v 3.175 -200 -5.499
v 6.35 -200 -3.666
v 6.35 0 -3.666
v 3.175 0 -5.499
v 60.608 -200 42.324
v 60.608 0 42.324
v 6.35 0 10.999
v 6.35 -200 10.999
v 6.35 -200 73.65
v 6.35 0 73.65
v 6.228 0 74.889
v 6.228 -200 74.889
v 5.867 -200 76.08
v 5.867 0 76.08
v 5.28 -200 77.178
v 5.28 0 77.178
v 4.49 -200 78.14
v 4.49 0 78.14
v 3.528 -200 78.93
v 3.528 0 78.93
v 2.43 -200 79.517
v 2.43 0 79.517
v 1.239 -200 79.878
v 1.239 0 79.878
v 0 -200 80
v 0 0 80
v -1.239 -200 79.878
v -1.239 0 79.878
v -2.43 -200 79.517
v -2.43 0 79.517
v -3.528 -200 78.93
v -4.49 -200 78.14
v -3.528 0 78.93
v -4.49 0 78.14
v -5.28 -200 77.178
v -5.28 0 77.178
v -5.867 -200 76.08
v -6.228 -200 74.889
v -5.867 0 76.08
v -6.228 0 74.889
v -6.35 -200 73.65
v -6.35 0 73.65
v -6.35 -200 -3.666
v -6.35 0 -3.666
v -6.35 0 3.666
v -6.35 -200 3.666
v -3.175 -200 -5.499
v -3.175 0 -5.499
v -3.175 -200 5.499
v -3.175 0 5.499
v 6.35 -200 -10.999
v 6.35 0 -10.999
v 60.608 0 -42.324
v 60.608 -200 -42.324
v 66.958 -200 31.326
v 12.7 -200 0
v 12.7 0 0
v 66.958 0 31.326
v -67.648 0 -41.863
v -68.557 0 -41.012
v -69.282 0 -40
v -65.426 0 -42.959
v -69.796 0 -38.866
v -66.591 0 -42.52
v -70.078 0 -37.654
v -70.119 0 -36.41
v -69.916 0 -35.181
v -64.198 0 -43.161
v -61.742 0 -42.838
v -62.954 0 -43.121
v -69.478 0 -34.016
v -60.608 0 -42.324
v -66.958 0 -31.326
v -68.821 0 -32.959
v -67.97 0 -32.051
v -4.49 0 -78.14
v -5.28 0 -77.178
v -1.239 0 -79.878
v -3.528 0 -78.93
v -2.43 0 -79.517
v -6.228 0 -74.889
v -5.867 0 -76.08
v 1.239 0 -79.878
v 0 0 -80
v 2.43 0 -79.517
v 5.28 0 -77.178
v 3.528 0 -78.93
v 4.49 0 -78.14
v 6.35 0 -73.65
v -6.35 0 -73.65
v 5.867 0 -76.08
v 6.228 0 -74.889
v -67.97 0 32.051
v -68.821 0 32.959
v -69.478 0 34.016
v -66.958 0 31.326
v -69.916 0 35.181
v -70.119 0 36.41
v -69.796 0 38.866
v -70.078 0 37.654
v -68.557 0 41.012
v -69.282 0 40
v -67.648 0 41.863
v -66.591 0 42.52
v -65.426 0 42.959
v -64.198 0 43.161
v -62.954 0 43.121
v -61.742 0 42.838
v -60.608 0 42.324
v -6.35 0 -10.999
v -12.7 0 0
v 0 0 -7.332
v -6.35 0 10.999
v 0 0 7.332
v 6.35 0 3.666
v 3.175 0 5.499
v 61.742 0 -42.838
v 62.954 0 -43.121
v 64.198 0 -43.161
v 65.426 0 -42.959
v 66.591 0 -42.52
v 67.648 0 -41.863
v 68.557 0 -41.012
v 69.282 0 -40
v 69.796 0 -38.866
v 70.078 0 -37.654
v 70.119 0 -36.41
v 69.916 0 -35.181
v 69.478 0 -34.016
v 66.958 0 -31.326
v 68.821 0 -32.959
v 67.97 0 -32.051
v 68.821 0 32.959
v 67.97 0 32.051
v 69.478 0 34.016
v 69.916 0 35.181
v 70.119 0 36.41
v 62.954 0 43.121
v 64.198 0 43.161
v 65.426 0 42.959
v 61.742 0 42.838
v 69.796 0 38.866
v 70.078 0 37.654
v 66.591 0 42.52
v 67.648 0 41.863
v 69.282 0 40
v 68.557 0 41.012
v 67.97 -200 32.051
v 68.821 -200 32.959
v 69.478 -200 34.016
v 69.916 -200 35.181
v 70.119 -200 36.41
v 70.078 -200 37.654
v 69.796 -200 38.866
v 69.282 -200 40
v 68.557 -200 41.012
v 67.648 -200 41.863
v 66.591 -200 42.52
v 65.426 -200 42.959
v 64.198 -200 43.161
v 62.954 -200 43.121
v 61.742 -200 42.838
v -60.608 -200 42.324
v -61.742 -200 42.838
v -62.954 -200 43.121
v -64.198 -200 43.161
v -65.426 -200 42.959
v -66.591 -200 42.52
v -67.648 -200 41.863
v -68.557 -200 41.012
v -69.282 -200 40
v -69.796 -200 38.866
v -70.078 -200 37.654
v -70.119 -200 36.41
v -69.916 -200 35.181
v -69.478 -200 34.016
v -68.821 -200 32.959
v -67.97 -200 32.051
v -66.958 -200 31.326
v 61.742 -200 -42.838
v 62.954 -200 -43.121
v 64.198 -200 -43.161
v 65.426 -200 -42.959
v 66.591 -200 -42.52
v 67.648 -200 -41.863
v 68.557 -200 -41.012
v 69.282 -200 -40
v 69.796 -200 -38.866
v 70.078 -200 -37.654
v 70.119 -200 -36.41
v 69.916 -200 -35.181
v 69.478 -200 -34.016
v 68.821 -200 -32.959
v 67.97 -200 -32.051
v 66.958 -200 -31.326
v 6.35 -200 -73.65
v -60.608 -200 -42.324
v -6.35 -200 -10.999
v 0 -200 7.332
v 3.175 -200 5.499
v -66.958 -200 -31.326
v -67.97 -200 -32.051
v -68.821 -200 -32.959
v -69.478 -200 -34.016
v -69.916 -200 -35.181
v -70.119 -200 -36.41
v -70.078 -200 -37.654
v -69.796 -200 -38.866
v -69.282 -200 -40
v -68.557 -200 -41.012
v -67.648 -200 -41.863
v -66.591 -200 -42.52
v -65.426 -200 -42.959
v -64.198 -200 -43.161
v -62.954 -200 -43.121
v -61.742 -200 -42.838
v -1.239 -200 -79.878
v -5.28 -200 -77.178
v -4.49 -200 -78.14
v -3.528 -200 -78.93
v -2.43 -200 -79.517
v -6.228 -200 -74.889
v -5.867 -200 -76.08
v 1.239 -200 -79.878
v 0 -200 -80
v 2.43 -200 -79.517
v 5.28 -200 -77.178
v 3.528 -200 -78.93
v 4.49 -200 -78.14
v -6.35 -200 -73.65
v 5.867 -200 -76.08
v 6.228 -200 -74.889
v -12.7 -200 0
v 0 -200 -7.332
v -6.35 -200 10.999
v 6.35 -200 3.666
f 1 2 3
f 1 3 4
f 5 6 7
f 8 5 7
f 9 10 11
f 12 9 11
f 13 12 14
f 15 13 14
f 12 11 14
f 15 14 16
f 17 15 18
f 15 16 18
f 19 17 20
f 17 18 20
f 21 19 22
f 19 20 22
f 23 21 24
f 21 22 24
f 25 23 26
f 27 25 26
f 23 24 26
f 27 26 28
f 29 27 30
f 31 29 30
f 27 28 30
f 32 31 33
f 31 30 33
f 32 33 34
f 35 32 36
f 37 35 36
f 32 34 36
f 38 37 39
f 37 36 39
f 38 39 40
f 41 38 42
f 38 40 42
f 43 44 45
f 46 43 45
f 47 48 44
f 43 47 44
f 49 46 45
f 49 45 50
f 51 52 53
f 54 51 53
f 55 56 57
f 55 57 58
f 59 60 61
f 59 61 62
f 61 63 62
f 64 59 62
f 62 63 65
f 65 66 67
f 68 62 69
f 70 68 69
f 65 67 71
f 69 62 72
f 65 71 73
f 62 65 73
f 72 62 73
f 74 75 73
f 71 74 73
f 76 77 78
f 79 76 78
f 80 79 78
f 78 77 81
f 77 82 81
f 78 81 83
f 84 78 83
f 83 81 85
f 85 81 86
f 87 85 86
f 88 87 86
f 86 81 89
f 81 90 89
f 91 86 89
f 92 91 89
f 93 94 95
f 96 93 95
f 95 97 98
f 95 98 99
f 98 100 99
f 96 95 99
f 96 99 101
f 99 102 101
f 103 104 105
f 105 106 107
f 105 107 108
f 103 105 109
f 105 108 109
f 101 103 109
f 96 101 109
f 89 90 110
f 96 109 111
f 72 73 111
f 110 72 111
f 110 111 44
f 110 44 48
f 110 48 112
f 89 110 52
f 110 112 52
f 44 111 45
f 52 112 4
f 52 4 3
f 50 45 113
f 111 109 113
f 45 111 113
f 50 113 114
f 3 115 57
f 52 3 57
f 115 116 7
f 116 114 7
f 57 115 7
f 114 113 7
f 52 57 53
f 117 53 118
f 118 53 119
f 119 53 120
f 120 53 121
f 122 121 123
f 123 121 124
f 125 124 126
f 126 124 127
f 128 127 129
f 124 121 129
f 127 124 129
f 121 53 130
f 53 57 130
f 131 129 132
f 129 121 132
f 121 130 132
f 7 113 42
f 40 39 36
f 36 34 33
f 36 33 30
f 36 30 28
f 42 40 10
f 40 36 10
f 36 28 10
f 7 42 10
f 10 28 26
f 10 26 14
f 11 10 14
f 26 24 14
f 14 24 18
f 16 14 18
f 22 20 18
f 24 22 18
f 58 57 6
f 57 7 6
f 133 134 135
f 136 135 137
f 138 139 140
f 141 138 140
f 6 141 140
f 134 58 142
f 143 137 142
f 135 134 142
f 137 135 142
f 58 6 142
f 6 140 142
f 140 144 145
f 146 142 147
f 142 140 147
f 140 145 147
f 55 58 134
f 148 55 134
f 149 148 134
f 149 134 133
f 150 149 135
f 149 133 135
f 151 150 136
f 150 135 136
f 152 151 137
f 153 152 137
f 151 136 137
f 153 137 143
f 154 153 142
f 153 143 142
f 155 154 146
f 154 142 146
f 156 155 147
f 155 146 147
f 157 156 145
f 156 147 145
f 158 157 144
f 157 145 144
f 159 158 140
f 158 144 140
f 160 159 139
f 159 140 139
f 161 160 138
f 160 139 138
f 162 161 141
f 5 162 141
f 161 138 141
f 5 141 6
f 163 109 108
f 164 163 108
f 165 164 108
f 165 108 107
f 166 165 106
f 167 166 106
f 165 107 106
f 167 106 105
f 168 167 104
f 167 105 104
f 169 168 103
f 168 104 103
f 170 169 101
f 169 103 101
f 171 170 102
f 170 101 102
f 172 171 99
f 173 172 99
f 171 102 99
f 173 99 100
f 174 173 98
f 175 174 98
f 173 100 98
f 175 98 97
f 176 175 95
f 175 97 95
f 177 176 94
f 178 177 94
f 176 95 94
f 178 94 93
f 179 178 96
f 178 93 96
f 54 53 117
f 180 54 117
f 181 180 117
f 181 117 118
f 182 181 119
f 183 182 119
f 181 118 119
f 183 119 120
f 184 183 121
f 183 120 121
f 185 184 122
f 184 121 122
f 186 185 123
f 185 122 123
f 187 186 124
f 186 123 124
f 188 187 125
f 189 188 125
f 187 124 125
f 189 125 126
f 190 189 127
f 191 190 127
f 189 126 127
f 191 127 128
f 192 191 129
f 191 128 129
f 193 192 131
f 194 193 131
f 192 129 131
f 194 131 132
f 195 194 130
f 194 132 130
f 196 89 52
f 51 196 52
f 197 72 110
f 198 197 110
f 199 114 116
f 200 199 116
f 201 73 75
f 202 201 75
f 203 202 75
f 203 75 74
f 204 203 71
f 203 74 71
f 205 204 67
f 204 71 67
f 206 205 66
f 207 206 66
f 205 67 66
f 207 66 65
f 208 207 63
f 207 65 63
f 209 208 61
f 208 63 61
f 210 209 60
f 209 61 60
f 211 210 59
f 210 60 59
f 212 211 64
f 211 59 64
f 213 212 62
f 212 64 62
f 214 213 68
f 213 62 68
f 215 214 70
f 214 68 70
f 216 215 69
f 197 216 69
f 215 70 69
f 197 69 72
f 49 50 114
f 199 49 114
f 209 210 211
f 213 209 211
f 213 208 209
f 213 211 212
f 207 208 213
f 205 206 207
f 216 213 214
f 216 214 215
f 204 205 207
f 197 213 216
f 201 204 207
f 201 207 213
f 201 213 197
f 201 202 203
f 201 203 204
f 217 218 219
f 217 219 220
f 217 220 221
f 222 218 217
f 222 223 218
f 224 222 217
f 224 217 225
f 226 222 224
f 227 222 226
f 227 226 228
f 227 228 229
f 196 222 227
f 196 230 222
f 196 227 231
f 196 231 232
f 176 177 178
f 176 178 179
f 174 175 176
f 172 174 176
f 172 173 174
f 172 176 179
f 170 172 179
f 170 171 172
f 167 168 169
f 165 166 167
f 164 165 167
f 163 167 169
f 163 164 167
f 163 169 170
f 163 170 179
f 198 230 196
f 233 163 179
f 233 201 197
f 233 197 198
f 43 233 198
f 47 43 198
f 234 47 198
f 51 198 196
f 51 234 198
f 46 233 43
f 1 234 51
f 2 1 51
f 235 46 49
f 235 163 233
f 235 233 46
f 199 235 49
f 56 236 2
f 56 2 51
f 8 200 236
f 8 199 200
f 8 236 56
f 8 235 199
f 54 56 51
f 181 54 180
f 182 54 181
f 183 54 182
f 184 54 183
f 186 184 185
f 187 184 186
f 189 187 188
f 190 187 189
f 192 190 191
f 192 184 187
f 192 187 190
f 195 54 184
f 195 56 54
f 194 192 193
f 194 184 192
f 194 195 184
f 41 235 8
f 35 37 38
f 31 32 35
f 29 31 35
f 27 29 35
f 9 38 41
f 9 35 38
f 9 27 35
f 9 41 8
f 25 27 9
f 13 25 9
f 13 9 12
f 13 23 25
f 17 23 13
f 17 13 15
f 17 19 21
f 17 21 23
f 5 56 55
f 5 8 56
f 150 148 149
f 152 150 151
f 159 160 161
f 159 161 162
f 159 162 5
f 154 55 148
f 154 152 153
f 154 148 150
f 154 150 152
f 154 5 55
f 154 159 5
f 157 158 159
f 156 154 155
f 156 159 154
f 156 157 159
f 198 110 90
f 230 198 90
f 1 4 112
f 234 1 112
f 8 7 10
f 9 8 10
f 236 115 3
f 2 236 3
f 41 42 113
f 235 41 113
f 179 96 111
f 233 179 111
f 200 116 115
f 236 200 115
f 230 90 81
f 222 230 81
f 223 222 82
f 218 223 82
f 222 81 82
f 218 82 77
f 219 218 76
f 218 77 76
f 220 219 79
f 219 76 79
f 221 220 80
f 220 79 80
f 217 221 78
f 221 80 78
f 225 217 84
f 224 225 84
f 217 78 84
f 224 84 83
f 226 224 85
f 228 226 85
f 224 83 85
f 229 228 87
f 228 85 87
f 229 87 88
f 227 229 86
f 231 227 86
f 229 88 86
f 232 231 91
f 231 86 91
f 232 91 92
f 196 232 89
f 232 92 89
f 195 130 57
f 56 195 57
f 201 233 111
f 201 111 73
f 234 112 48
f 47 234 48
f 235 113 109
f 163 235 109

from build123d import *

# Parameters (mm, degrees)
F1_DEPTH = 200


with BuildPart() as f1:
    # F0 (on Front) → F1 (new body)
    with BuildSketch(Plane.XZ):
        with BuildLine():
            Line((6.35, -10.9985226281), (0, -7.3323484187))
            Line((0, -7.3323484187), (-6.35, -10.9985226281))
            Line((-6.35, -10.9985226281), (-6.35, -73.65))
            ThreePointArc((-6.35, -73.65), (0, -80), (6.35, -73.65))
            Line((6.35, -73.65), (6.35, -10.9985226281))
        make_face()
        Polygon((-6.35, -10.9985226281), (0, -7.3323484187), (-3.175, -5.499261314), (-6.35, -3.6661742094), align=None)
        Polygon((3.175, -5.499261314), (0, -7.3323484187), (6.35, -10.9985226281), (6.35, -3.6661742094), align=None)
        with BuildLine():
            Line((-6.35, 10.9985226281), (0, 7.3323484187))
            Line((0, 7.3323484187), (6.35, 10.9985226281))
            Line((6.35, 10.9985226281), (6.35, 73.65))
            ThreePointArc((6.35, 73.65), (0, 80), (-6.35, 73.65))
            Line((-6.35, 73.65), (-6.35, 10.9985226281))
        make_face()
        Polygon((6.35, 10.9985226281), (0, 7.3323484187), (3.175, 5.499261314), (6.35, 3.6661742094), align=None)
        Polygon((-3.175, 5.499261314), (0, 7.3323484187), (-6.35, 10.9985226281), (-6.35, 3.6661742094), align=None)
        with BuildLine():
            Line((-6.35, -10.9985226281), (-6.35, -3.6661742094))
            Line((-6.35, -3.6661742094), (-12.7, 0))
            Line((-12.7, 0), (-66.9577709887, -31.325738686))
            ThreePointArc((-66.9577709887, -31.325738686), (-69.2820323028, -40), (-60.6077709887, -42.324261314))
            Line((-60.6077709887, -42.324261314), (-6.35, -10.9985226281))
        make_face()
        Polygon((-12.7, 0), (-6.35, -3.6661742094), (-6.35, 0), (-6.35, 3.6661742094), align=None)
        Polygon((6.35, 0), (6.35, -3.6661742094), (12.7, 0), (6.35, 3.6661742094), align=None)
        with BuildLine():
            Line((12.7, 0), (6.35, -3.6661742094))
            Line((6.35, -3.6661742094), (6.35, -10.9985226281))
            Line((6.35, -10.9985226281), (60.6077709887, -42.324261314))
            ThreePointArc((60.6077709887, -42.324261314), (69.2820323028, -40), (66.9577709887, -31.325738686))
            Line((66.9577709887, -31.325738686), (12.7, 0))
        make_face()
        with BuildLine():
            Line((-12.7, 0), (-6.35, 3.6661742094))
            Line((-6.35, 3.6661742094), (-6.35, 10.9985226281))
            Line((-6.35, 10.9985226281), (-60.6077709887, 42.324261314))
            ThreePointArc((-60.6077709887, 42.324261314), (-69.2820323028, 40), (-66.9577709887, 31.325738686))
            Line((-66.9577709887, 31.325738686), (-12.7, 0))
        make_face()
        with BuildLine():
            Line((6.35, 10.9985226281), (6.35, 3.6661742094))
            Line((6.35, 3.6661742094), (12.7, 0))
            Line((12.7, 0), (66.9577709887, 31.325738686))
            ThreePointArc((66.9577709887, 31.325738686), (69.2820323028, 40), (60.6077709887, 42.324261314))
            Line((60.6077709887, 42.324261314), (6.35, 10.9985226281))
        make_face()
    extrude(amount=F1_DEPTH)


solid = f1.part
